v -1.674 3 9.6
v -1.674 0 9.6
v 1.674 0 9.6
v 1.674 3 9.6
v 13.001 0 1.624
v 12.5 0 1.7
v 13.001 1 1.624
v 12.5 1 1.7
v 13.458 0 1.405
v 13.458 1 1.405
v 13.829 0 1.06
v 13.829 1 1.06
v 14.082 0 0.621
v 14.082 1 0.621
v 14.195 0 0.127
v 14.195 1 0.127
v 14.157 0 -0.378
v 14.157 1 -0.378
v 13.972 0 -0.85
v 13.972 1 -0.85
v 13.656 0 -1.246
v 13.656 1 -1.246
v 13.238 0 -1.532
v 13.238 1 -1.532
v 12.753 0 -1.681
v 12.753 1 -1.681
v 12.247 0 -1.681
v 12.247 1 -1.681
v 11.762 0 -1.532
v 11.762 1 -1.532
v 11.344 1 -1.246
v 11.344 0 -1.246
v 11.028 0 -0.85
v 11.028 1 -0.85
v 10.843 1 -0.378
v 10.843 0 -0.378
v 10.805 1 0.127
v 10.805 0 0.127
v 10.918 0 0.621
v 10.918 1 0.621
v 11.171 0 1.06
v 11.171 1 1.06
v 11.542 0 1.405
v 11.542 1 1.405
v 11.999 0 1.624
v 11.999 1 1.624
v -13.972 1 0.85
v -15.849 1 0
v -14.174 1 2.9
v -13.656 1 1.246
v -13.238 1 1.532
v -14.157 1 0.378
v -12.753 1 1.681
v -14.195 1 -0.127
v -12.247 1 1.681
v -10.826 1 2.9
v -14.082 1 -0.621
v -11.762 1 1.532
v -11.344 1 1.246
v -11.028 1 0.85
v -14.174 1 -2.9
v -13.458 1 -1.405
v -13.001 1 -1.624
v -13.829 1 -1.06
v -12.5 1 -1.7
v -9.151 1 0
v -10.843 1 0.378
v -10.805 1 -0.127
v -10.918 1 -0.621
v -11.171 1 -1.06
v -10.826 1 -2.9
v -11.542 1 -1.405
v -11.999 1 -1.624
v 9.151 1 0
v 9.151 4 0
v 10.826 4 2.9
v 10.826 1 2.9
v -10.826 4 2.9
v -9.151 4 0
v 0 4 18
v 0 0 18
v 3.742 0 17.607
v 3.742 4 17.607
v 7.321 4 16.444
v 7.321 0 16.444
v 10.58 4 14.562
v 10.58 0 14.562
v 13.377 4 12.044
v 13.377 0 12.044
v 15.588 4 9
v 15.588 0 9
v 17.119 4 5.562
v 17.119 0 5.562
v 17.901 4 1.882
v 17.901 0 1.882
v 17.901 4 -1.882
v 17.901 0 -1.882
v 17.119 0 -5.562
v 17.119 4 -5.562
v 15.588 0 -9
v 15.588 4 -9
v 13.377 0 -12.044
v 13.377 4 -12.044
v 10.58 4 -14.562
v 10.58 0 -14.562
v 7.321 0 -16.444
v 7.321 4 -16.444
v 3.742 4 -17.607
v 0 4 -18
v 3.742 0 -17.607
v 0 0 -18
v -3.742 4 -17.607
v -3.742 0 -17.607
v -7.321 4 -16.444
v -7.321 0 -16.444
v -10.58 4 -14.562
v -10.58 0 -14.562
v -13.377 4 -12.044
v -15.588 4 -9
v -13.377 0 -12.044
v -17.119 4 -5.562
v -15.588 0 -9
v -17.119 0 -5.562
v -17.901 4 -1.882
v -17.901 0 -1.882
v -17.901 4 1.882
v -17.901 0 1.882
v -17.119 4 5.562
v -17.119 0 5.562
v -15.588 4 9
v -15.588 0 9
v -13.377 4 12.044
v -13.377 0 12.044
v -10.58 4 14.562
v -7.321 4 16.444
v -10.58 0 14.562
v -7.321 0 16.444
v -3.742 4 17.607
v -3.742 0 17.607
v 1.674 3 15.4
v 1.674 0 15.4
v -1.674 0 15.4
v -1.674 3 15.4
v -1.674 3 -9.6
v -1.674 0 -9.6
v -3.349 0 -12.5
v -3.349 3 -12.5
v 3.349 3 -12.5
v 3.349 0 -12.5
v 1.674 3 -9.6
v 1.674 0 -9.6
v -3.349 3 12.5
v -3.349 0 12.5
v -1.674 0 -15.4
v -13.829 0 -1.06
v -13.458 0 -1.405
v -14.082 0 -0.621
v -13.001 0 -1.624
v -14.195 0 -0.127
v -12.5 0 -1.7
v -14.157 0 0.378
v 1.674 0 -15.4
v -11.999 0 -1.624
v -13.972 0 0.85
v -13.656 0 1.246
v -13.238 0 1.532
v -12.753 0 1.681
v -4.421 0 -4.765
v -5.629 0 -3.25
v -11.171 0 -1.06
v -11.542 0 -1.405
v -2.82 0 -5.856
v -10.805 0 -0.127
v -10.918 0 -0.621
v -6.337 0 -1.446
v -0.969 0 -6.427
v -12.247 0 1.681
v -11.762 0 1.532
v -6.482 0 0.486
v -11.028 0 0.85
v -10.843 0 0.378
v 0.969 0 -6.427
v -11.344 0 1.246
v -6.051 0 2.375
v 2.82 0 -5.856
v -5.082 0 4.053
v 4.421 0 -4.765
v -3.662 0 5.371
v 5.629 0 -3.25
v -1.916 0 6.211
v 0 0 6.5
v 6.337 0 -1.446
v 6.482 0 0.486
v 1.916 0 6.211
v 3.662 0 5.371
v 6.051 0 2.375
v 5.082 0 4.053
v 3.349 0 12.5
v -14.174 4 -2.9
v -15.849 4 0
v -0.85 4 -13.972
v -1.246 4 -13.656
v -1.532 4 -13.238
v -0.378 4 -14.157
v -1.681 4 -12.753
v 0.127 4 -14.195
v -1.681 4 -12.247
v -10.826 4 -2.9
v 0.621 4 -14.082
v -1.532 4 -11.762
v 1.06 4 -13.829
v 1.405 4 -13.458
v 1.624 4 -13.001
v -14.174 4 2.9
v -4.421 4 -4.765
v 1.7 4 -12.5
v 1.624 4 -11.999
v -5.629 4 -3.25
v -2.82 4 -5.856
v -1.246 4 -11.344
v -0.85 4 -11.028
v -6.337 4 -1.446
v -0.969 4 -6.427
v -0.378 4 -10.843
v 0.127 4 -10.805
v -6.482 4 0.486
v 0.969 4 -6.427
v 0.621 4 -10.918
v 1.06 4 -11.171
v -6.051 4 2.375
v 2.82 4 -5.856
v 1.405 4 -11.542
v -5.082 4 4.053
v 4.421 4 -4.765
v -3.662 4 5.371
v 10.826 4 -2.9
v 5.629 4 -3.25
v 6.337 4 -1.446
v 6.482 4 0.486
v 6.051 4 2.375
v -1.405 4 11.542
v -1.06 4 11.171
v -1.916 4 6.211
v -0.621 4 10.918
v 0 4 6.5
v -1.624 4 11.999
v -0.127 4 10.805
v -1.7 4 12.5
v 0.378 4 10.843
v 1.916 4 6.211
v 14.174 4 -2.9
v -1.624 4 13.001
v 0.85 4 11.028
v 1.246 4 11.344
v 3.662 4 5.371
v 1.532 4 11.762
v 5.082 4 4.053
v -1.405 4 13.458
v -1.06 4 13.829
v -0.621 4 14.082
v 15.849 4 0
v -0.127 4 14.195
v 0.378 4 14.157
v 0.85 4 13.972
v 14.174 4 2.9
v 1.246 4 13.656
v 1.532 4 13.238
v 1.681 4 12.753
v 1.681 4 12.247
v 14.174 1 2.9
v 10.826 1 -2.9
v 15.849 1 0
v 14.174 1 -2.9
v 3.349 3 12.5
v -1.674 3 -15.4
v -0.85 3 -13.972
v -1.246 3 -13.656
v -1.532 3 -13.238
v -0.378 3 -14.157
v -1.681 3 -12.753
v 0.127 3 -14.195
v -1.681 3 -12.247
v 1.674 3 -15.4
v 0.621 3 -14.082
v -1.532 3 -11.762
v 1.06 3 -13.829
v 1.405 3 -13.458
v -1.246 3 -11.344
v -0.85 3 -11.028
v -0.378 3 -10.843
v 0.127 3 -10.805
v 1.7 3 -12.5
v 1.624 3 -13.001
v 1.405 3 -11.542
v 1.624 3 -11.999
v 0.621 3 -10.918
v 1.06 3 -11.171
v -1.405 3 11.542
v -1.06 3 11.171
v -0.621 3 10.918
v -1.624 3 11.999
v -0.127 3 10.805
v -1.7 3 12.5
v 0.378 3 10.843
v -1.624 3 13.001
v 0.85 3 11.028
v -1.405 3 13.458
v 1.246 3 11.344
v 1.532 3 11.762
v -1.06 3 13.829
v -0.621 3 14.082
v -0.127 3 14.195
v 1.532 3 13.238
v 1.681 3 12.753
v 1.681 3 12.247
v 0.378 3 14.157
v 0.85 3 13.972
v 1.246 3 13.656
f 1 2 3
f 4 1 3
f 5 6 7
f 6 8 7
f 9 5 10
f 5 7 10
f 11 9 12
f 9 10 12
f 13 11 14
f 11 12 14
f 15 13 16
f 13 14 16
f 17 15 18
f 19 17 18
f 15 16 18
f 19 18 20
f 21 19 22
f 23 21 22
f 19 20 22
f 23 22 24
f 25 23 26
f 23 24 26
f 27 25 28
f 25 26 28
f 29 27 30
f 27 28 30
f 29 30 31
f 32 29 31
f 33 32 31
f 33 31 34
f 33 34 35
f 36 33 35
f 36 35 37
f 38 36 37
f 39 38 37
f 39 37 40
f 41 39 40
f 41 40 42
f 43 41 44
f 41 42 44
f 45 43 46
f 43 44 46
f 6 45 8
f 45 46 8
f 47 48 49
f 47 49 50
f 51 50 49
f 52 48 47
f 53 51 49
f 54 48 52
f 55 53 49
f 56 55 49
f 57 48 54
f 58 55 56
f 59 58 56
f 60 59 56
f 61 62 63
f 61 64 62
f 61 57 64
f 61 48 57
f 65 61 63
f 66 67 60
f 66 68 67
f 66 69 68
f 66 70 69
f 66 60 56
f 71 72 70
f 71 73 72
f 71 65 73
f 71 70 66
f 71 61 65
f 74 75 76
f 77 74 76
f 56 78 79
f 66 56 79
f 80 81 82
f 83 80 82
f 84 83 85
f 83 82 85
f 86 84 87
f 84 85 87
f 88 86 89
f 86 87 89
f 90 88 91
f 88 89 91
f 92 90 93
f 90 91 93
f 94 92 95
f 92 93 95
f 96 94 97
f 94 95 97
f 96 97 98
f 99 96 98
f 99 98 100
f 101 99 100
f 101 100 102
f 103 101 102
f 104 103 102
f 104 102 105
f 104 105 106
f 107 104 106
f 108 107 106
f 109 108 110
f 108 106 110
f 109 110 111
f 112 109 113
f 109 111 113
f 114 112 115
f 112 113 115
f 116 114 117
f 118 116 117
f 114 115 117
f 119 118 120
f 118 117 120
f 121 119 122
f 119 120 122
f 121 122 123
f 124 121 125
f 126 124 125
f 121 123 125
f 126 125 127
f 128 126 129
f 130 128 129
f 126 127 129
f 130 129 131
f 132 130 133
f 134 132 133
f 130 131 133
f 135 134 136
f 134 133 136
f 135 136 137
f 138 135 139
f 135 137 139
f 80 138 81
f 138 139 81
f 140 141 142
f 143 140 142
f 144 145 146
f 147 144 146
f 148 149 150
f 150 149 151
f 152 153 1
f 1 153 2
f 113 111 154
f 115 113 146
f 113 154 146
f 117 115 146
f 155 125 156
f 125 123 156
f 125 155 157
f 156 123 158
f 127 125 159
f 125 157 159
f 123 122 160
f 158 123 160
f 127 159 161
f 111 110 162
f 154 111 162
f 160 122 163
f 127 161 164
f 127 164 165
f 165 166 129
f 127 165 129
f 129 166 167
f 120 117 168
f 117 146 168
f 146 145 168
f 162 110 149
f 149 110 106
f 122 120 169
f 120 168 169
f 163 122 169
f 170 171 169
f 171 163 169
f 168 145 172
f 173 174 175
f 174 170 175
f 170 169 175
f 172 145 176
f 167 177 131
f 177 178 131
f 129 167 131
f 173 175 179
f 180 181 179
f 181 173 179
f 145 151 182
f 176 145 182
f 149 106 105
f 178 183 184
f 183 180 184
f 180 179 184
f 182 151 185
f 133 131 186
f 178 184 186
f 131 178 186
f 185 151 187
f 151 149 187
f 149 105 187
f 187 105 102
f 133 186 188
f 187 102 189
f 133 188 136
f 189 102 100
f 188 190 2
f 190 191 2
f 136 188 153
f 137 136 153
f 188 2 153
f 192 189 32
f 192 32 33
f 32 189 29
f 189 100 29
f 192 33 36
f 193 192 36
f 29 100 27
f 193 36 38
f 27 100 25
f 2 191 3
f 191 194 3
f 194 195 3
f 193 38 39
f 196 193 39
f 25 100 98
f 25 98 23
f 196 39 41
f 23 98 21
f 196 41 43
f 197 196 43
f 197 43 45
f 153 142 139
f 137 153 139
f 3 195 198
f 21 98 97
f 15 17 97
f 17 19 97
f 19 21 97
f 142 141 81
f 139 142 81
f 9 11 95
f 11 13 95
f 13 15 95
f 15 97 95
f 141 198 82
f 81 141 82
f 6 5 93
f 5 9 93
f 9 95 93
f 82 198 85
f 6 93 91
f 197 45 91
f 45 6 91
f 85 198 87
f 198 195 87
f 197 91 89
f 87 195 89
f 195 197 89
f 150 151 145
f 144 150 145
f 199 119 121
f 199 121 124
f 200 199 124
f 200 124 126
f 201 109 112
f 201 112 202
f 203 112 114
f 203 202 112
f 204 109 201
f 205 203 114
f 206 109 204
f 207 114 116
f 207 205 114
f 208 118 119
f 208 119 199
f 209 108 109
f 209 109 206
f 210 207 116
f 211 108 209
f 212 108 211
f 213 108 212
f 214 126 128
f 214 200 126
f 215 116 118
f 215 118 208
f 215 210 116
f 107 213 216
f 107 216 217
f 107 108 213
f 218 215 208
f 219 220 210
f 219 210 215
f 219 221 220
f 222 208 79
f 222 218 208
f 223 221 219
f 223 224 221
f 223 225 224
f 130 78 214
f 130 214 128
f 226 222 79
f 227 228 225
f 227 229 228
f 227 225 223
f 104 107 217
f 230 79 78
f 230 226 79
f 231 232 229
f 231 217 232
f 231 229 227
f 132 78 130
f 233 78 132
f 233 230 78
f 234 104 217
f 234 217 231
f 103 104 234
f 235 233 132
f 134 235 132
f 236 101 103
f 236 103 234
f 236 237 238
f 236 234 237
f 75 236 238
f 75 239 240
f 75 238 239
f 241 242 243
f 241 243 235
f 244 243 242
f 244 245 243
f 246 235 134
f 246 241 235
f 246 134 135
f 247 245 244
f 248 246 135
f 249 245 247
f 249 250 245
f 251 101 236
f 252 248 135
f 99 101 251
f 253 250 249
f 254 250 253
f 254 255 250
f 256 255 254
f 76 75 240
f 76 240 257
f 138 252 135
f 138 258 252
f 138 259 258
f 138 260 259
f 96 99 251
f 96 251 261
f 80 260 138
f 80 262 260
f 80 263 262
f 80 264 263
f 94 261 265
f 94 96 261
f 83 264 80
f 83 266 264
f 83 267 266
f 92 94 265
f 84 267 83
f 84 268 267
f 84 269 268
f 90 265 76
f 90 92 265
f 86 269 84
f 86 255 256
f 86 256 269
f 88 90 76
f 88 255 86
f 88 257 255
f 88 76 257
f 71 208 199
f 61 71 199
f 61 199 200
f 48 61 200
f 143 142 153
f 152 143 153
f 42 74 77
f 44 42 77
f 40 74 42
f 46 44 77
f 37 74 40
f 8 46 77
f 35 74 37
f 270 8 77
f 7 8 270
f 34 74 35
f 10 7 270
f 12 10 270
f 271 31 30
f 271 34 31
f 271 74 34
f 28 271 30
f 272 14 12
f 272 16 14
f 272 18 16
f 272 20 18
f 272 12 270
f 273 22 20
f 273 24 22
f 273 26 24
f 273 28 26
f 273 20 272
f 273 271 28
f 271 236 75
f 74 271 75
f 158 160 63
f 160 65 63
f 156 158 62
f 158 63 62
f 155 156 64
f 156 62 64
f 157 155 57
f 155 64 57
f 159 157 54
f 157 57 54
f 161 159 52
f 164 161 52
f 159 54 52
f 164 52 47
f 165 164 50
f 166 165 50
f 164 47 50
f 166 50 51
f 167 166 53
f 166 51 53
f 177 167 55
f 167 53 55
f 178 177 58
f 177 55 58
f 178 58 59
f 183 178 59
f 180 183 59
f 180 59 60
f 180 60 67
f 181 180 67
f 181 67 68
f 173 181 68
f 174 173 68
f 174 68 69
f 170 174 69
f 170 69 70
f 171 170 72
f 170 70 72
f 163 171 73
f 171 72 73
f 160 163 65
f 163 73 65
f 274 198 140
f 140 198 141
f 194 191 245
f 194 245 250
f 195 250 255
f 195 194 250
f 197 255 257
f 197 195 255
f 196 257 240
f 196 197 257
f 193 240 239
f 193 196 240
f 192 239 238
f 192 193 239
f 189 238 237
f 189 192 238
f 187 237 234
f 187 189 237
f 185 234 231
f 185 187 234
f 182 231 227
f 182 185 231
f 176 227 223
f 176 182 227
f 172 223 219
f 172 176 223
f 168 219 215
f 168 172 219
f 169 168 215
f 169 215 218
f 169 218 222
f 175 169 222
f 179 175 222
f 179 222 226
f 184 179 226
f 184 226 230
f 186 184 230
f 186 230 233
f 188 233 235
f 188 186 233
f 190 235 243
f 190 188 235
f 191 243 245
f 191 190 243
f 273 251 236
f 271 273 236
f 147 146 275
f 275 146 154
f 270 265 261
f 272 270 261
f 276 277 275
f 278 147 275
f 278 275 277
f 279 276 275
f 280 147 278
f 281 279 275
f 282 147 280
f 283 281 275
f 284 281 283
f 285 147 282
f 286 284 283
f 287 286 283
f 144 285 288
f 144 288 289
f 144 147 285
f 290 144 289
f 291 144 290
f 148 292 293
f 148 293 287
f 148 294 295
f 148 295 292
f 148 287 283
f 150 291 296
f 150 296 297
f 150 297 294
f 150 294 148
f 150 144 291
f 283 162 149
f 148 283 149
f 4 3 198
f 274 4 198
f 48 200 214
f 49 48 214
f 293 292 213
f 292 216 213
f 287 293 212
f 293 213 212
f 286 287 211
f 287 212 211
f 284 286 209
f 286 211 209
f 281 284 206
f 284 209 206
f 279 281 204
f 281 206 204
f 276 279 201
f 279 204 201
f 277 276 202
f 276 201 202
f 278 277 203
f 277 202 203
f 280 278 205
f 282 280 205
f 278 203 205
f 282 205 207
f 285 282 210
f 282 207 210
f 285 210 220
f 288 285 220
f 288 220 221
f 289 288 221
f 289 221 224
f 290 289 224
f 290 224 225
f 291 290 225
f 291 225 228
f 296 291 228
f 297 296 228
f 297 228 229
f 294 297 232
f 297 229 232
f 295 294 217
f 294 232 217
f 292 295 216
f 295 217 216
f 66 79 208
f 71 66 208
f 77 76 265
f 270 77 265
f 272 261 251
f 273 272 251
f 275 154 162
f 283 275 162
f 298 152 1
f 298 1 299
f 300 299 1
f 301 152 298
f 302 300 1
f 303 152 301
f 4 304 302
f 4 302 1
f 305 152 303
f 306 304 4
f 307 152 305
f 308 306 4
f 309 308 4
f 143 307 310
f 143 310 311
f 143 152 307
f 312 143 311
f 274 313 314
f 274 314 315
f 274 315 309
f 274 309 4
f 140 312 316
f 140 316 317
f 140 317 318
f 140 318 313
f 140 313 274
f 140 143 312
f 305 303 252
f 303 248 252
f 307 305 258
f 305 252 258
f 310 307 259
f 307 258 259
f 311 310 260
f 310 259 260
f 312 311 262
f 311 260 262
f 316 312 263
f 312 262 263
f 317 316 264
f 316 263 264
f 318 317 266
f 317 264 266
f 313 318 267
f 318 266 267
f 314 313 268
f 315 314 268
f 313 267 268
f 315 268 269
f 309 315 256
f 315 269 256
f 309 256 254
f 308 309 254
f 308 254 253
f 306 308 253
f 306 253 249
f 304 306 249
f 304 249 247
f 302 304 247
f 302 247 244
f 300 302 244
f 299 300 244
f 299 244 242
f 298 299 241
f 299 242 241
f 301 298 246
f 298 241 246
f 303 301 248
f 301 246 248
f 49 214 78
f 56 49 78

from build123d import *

# Parameters (mm, degrees)
SKETCH_1_R               = 18
SKETCH_1_R_2             = 6.5
EXTRUDE_366_DEPTH        = 4
CUT_EXTRUDE_589_DEPTH    = 3
SKETCH_3_R               = 1.7
CUT_EXTRUDE_770_DEPTH    = 26.632011236
PATTERN_CIRCULAR_1_COUNT = 4
CUT_EXTRUDE_1506_DEPTH   = 3


with BuildPart() as part:
    # Эскиз1 → Extrude 366 (new body)
    with BuildSketch(Plane(origin=(0, 0, 0), x_dir=(1, 0, 0), z_dir=(0, 1, 0))):
        with Locations(Location((0, 0, 0), (0, 0, 270))):
            Circle(SKETCH_1_R)
        with Locations(Location((0, 0, 0), (0, 0, 270))):
            Circle(SKETCH_1_R_2, mode=Mode.SUBTRACT)
    extrude(amount=EXTRUDE_366_DEPTH)

    # Эскиз2 → Cut-Extrude 589 (cut)
    with BuildSketch(Plane(origin=(0, 4, 0), x_dir=(1, 0, 0), z_dir=(0, 1, 0))):
        Polygon((-15.848631561, -2.23e-07), (-14.174315588, -2.900000111), (-10.825684027, -2.899999889), (-9.151368439, 2.23e-07), (-10.825684412, 2.900000111), (-14.174315973, 2.899999889), align=None)
        Polygon((15.848631561, -8.31e-07), (14.174315781, 2.899999169), (10.825684219, 2.899999169), (9.151368439, -8.31e-07), (10.825684219, -2.900000831), (14.174315781, -2.900000831), align=None)
    extrude(amount=-CUT_EXTRUDE_589_DEPTH, mode=Mode.SUBTRACT)

    # Эскиз3 → Cut-Extrude 770 (cut, symmetric)
    with BuildSketch(Plane(origin=(0, 1, 0), x_dir=(1, 0, 0), z_dir=(0, 1, 0))):
        with Locations(Location((12.5, 0, 0), (0, 0, 270))):
            Circle(SKETCH_3_R)
    cut_extrude_770 = extrude(amount=CUT_EXTRUDE_770_DEPTH, both=True, mode=Mode.SUBTRACT)

    # Круговой массив1: Cut-Extrude 770 ×4 about axis
    pattern_circular_1_axis = Axis((0, 0, 0), (0, 1, 0))
    for i in range(1, PATTERN_CIRCULAR_1_COUNT):
        add(cut_extrude_770.rotate(pattern_circular_1_axis, i * 360 / PATTERN_CIRCULAR_1_COUNT), mode=Mode.SUBTRACT)

    # Эскиз5 → Cut-Extrude 1506 (cut)
    with BuildSketch(Plane.XZ):
        Polygon((3.348631561, 12.5), (1.674315781, 15.4), (-1.674315781, 15.4), (-3.348631561, 12.5), (-1.674315781, 9.6), (1.674315781, 9.6), align=None)
        Polygon((-3.348631561, -12.5), (-1.674315781, -15.4), (1.674315781, -15.4), (3.348631561, -12.5), (1.674315781, -9.6), (-1.674315781, -9.6), align=None)
    extrude(amount=-CUT_EXTRUDE_1506_DEPTH, mode=Mode.SUBTRACT)


solid = part.part
